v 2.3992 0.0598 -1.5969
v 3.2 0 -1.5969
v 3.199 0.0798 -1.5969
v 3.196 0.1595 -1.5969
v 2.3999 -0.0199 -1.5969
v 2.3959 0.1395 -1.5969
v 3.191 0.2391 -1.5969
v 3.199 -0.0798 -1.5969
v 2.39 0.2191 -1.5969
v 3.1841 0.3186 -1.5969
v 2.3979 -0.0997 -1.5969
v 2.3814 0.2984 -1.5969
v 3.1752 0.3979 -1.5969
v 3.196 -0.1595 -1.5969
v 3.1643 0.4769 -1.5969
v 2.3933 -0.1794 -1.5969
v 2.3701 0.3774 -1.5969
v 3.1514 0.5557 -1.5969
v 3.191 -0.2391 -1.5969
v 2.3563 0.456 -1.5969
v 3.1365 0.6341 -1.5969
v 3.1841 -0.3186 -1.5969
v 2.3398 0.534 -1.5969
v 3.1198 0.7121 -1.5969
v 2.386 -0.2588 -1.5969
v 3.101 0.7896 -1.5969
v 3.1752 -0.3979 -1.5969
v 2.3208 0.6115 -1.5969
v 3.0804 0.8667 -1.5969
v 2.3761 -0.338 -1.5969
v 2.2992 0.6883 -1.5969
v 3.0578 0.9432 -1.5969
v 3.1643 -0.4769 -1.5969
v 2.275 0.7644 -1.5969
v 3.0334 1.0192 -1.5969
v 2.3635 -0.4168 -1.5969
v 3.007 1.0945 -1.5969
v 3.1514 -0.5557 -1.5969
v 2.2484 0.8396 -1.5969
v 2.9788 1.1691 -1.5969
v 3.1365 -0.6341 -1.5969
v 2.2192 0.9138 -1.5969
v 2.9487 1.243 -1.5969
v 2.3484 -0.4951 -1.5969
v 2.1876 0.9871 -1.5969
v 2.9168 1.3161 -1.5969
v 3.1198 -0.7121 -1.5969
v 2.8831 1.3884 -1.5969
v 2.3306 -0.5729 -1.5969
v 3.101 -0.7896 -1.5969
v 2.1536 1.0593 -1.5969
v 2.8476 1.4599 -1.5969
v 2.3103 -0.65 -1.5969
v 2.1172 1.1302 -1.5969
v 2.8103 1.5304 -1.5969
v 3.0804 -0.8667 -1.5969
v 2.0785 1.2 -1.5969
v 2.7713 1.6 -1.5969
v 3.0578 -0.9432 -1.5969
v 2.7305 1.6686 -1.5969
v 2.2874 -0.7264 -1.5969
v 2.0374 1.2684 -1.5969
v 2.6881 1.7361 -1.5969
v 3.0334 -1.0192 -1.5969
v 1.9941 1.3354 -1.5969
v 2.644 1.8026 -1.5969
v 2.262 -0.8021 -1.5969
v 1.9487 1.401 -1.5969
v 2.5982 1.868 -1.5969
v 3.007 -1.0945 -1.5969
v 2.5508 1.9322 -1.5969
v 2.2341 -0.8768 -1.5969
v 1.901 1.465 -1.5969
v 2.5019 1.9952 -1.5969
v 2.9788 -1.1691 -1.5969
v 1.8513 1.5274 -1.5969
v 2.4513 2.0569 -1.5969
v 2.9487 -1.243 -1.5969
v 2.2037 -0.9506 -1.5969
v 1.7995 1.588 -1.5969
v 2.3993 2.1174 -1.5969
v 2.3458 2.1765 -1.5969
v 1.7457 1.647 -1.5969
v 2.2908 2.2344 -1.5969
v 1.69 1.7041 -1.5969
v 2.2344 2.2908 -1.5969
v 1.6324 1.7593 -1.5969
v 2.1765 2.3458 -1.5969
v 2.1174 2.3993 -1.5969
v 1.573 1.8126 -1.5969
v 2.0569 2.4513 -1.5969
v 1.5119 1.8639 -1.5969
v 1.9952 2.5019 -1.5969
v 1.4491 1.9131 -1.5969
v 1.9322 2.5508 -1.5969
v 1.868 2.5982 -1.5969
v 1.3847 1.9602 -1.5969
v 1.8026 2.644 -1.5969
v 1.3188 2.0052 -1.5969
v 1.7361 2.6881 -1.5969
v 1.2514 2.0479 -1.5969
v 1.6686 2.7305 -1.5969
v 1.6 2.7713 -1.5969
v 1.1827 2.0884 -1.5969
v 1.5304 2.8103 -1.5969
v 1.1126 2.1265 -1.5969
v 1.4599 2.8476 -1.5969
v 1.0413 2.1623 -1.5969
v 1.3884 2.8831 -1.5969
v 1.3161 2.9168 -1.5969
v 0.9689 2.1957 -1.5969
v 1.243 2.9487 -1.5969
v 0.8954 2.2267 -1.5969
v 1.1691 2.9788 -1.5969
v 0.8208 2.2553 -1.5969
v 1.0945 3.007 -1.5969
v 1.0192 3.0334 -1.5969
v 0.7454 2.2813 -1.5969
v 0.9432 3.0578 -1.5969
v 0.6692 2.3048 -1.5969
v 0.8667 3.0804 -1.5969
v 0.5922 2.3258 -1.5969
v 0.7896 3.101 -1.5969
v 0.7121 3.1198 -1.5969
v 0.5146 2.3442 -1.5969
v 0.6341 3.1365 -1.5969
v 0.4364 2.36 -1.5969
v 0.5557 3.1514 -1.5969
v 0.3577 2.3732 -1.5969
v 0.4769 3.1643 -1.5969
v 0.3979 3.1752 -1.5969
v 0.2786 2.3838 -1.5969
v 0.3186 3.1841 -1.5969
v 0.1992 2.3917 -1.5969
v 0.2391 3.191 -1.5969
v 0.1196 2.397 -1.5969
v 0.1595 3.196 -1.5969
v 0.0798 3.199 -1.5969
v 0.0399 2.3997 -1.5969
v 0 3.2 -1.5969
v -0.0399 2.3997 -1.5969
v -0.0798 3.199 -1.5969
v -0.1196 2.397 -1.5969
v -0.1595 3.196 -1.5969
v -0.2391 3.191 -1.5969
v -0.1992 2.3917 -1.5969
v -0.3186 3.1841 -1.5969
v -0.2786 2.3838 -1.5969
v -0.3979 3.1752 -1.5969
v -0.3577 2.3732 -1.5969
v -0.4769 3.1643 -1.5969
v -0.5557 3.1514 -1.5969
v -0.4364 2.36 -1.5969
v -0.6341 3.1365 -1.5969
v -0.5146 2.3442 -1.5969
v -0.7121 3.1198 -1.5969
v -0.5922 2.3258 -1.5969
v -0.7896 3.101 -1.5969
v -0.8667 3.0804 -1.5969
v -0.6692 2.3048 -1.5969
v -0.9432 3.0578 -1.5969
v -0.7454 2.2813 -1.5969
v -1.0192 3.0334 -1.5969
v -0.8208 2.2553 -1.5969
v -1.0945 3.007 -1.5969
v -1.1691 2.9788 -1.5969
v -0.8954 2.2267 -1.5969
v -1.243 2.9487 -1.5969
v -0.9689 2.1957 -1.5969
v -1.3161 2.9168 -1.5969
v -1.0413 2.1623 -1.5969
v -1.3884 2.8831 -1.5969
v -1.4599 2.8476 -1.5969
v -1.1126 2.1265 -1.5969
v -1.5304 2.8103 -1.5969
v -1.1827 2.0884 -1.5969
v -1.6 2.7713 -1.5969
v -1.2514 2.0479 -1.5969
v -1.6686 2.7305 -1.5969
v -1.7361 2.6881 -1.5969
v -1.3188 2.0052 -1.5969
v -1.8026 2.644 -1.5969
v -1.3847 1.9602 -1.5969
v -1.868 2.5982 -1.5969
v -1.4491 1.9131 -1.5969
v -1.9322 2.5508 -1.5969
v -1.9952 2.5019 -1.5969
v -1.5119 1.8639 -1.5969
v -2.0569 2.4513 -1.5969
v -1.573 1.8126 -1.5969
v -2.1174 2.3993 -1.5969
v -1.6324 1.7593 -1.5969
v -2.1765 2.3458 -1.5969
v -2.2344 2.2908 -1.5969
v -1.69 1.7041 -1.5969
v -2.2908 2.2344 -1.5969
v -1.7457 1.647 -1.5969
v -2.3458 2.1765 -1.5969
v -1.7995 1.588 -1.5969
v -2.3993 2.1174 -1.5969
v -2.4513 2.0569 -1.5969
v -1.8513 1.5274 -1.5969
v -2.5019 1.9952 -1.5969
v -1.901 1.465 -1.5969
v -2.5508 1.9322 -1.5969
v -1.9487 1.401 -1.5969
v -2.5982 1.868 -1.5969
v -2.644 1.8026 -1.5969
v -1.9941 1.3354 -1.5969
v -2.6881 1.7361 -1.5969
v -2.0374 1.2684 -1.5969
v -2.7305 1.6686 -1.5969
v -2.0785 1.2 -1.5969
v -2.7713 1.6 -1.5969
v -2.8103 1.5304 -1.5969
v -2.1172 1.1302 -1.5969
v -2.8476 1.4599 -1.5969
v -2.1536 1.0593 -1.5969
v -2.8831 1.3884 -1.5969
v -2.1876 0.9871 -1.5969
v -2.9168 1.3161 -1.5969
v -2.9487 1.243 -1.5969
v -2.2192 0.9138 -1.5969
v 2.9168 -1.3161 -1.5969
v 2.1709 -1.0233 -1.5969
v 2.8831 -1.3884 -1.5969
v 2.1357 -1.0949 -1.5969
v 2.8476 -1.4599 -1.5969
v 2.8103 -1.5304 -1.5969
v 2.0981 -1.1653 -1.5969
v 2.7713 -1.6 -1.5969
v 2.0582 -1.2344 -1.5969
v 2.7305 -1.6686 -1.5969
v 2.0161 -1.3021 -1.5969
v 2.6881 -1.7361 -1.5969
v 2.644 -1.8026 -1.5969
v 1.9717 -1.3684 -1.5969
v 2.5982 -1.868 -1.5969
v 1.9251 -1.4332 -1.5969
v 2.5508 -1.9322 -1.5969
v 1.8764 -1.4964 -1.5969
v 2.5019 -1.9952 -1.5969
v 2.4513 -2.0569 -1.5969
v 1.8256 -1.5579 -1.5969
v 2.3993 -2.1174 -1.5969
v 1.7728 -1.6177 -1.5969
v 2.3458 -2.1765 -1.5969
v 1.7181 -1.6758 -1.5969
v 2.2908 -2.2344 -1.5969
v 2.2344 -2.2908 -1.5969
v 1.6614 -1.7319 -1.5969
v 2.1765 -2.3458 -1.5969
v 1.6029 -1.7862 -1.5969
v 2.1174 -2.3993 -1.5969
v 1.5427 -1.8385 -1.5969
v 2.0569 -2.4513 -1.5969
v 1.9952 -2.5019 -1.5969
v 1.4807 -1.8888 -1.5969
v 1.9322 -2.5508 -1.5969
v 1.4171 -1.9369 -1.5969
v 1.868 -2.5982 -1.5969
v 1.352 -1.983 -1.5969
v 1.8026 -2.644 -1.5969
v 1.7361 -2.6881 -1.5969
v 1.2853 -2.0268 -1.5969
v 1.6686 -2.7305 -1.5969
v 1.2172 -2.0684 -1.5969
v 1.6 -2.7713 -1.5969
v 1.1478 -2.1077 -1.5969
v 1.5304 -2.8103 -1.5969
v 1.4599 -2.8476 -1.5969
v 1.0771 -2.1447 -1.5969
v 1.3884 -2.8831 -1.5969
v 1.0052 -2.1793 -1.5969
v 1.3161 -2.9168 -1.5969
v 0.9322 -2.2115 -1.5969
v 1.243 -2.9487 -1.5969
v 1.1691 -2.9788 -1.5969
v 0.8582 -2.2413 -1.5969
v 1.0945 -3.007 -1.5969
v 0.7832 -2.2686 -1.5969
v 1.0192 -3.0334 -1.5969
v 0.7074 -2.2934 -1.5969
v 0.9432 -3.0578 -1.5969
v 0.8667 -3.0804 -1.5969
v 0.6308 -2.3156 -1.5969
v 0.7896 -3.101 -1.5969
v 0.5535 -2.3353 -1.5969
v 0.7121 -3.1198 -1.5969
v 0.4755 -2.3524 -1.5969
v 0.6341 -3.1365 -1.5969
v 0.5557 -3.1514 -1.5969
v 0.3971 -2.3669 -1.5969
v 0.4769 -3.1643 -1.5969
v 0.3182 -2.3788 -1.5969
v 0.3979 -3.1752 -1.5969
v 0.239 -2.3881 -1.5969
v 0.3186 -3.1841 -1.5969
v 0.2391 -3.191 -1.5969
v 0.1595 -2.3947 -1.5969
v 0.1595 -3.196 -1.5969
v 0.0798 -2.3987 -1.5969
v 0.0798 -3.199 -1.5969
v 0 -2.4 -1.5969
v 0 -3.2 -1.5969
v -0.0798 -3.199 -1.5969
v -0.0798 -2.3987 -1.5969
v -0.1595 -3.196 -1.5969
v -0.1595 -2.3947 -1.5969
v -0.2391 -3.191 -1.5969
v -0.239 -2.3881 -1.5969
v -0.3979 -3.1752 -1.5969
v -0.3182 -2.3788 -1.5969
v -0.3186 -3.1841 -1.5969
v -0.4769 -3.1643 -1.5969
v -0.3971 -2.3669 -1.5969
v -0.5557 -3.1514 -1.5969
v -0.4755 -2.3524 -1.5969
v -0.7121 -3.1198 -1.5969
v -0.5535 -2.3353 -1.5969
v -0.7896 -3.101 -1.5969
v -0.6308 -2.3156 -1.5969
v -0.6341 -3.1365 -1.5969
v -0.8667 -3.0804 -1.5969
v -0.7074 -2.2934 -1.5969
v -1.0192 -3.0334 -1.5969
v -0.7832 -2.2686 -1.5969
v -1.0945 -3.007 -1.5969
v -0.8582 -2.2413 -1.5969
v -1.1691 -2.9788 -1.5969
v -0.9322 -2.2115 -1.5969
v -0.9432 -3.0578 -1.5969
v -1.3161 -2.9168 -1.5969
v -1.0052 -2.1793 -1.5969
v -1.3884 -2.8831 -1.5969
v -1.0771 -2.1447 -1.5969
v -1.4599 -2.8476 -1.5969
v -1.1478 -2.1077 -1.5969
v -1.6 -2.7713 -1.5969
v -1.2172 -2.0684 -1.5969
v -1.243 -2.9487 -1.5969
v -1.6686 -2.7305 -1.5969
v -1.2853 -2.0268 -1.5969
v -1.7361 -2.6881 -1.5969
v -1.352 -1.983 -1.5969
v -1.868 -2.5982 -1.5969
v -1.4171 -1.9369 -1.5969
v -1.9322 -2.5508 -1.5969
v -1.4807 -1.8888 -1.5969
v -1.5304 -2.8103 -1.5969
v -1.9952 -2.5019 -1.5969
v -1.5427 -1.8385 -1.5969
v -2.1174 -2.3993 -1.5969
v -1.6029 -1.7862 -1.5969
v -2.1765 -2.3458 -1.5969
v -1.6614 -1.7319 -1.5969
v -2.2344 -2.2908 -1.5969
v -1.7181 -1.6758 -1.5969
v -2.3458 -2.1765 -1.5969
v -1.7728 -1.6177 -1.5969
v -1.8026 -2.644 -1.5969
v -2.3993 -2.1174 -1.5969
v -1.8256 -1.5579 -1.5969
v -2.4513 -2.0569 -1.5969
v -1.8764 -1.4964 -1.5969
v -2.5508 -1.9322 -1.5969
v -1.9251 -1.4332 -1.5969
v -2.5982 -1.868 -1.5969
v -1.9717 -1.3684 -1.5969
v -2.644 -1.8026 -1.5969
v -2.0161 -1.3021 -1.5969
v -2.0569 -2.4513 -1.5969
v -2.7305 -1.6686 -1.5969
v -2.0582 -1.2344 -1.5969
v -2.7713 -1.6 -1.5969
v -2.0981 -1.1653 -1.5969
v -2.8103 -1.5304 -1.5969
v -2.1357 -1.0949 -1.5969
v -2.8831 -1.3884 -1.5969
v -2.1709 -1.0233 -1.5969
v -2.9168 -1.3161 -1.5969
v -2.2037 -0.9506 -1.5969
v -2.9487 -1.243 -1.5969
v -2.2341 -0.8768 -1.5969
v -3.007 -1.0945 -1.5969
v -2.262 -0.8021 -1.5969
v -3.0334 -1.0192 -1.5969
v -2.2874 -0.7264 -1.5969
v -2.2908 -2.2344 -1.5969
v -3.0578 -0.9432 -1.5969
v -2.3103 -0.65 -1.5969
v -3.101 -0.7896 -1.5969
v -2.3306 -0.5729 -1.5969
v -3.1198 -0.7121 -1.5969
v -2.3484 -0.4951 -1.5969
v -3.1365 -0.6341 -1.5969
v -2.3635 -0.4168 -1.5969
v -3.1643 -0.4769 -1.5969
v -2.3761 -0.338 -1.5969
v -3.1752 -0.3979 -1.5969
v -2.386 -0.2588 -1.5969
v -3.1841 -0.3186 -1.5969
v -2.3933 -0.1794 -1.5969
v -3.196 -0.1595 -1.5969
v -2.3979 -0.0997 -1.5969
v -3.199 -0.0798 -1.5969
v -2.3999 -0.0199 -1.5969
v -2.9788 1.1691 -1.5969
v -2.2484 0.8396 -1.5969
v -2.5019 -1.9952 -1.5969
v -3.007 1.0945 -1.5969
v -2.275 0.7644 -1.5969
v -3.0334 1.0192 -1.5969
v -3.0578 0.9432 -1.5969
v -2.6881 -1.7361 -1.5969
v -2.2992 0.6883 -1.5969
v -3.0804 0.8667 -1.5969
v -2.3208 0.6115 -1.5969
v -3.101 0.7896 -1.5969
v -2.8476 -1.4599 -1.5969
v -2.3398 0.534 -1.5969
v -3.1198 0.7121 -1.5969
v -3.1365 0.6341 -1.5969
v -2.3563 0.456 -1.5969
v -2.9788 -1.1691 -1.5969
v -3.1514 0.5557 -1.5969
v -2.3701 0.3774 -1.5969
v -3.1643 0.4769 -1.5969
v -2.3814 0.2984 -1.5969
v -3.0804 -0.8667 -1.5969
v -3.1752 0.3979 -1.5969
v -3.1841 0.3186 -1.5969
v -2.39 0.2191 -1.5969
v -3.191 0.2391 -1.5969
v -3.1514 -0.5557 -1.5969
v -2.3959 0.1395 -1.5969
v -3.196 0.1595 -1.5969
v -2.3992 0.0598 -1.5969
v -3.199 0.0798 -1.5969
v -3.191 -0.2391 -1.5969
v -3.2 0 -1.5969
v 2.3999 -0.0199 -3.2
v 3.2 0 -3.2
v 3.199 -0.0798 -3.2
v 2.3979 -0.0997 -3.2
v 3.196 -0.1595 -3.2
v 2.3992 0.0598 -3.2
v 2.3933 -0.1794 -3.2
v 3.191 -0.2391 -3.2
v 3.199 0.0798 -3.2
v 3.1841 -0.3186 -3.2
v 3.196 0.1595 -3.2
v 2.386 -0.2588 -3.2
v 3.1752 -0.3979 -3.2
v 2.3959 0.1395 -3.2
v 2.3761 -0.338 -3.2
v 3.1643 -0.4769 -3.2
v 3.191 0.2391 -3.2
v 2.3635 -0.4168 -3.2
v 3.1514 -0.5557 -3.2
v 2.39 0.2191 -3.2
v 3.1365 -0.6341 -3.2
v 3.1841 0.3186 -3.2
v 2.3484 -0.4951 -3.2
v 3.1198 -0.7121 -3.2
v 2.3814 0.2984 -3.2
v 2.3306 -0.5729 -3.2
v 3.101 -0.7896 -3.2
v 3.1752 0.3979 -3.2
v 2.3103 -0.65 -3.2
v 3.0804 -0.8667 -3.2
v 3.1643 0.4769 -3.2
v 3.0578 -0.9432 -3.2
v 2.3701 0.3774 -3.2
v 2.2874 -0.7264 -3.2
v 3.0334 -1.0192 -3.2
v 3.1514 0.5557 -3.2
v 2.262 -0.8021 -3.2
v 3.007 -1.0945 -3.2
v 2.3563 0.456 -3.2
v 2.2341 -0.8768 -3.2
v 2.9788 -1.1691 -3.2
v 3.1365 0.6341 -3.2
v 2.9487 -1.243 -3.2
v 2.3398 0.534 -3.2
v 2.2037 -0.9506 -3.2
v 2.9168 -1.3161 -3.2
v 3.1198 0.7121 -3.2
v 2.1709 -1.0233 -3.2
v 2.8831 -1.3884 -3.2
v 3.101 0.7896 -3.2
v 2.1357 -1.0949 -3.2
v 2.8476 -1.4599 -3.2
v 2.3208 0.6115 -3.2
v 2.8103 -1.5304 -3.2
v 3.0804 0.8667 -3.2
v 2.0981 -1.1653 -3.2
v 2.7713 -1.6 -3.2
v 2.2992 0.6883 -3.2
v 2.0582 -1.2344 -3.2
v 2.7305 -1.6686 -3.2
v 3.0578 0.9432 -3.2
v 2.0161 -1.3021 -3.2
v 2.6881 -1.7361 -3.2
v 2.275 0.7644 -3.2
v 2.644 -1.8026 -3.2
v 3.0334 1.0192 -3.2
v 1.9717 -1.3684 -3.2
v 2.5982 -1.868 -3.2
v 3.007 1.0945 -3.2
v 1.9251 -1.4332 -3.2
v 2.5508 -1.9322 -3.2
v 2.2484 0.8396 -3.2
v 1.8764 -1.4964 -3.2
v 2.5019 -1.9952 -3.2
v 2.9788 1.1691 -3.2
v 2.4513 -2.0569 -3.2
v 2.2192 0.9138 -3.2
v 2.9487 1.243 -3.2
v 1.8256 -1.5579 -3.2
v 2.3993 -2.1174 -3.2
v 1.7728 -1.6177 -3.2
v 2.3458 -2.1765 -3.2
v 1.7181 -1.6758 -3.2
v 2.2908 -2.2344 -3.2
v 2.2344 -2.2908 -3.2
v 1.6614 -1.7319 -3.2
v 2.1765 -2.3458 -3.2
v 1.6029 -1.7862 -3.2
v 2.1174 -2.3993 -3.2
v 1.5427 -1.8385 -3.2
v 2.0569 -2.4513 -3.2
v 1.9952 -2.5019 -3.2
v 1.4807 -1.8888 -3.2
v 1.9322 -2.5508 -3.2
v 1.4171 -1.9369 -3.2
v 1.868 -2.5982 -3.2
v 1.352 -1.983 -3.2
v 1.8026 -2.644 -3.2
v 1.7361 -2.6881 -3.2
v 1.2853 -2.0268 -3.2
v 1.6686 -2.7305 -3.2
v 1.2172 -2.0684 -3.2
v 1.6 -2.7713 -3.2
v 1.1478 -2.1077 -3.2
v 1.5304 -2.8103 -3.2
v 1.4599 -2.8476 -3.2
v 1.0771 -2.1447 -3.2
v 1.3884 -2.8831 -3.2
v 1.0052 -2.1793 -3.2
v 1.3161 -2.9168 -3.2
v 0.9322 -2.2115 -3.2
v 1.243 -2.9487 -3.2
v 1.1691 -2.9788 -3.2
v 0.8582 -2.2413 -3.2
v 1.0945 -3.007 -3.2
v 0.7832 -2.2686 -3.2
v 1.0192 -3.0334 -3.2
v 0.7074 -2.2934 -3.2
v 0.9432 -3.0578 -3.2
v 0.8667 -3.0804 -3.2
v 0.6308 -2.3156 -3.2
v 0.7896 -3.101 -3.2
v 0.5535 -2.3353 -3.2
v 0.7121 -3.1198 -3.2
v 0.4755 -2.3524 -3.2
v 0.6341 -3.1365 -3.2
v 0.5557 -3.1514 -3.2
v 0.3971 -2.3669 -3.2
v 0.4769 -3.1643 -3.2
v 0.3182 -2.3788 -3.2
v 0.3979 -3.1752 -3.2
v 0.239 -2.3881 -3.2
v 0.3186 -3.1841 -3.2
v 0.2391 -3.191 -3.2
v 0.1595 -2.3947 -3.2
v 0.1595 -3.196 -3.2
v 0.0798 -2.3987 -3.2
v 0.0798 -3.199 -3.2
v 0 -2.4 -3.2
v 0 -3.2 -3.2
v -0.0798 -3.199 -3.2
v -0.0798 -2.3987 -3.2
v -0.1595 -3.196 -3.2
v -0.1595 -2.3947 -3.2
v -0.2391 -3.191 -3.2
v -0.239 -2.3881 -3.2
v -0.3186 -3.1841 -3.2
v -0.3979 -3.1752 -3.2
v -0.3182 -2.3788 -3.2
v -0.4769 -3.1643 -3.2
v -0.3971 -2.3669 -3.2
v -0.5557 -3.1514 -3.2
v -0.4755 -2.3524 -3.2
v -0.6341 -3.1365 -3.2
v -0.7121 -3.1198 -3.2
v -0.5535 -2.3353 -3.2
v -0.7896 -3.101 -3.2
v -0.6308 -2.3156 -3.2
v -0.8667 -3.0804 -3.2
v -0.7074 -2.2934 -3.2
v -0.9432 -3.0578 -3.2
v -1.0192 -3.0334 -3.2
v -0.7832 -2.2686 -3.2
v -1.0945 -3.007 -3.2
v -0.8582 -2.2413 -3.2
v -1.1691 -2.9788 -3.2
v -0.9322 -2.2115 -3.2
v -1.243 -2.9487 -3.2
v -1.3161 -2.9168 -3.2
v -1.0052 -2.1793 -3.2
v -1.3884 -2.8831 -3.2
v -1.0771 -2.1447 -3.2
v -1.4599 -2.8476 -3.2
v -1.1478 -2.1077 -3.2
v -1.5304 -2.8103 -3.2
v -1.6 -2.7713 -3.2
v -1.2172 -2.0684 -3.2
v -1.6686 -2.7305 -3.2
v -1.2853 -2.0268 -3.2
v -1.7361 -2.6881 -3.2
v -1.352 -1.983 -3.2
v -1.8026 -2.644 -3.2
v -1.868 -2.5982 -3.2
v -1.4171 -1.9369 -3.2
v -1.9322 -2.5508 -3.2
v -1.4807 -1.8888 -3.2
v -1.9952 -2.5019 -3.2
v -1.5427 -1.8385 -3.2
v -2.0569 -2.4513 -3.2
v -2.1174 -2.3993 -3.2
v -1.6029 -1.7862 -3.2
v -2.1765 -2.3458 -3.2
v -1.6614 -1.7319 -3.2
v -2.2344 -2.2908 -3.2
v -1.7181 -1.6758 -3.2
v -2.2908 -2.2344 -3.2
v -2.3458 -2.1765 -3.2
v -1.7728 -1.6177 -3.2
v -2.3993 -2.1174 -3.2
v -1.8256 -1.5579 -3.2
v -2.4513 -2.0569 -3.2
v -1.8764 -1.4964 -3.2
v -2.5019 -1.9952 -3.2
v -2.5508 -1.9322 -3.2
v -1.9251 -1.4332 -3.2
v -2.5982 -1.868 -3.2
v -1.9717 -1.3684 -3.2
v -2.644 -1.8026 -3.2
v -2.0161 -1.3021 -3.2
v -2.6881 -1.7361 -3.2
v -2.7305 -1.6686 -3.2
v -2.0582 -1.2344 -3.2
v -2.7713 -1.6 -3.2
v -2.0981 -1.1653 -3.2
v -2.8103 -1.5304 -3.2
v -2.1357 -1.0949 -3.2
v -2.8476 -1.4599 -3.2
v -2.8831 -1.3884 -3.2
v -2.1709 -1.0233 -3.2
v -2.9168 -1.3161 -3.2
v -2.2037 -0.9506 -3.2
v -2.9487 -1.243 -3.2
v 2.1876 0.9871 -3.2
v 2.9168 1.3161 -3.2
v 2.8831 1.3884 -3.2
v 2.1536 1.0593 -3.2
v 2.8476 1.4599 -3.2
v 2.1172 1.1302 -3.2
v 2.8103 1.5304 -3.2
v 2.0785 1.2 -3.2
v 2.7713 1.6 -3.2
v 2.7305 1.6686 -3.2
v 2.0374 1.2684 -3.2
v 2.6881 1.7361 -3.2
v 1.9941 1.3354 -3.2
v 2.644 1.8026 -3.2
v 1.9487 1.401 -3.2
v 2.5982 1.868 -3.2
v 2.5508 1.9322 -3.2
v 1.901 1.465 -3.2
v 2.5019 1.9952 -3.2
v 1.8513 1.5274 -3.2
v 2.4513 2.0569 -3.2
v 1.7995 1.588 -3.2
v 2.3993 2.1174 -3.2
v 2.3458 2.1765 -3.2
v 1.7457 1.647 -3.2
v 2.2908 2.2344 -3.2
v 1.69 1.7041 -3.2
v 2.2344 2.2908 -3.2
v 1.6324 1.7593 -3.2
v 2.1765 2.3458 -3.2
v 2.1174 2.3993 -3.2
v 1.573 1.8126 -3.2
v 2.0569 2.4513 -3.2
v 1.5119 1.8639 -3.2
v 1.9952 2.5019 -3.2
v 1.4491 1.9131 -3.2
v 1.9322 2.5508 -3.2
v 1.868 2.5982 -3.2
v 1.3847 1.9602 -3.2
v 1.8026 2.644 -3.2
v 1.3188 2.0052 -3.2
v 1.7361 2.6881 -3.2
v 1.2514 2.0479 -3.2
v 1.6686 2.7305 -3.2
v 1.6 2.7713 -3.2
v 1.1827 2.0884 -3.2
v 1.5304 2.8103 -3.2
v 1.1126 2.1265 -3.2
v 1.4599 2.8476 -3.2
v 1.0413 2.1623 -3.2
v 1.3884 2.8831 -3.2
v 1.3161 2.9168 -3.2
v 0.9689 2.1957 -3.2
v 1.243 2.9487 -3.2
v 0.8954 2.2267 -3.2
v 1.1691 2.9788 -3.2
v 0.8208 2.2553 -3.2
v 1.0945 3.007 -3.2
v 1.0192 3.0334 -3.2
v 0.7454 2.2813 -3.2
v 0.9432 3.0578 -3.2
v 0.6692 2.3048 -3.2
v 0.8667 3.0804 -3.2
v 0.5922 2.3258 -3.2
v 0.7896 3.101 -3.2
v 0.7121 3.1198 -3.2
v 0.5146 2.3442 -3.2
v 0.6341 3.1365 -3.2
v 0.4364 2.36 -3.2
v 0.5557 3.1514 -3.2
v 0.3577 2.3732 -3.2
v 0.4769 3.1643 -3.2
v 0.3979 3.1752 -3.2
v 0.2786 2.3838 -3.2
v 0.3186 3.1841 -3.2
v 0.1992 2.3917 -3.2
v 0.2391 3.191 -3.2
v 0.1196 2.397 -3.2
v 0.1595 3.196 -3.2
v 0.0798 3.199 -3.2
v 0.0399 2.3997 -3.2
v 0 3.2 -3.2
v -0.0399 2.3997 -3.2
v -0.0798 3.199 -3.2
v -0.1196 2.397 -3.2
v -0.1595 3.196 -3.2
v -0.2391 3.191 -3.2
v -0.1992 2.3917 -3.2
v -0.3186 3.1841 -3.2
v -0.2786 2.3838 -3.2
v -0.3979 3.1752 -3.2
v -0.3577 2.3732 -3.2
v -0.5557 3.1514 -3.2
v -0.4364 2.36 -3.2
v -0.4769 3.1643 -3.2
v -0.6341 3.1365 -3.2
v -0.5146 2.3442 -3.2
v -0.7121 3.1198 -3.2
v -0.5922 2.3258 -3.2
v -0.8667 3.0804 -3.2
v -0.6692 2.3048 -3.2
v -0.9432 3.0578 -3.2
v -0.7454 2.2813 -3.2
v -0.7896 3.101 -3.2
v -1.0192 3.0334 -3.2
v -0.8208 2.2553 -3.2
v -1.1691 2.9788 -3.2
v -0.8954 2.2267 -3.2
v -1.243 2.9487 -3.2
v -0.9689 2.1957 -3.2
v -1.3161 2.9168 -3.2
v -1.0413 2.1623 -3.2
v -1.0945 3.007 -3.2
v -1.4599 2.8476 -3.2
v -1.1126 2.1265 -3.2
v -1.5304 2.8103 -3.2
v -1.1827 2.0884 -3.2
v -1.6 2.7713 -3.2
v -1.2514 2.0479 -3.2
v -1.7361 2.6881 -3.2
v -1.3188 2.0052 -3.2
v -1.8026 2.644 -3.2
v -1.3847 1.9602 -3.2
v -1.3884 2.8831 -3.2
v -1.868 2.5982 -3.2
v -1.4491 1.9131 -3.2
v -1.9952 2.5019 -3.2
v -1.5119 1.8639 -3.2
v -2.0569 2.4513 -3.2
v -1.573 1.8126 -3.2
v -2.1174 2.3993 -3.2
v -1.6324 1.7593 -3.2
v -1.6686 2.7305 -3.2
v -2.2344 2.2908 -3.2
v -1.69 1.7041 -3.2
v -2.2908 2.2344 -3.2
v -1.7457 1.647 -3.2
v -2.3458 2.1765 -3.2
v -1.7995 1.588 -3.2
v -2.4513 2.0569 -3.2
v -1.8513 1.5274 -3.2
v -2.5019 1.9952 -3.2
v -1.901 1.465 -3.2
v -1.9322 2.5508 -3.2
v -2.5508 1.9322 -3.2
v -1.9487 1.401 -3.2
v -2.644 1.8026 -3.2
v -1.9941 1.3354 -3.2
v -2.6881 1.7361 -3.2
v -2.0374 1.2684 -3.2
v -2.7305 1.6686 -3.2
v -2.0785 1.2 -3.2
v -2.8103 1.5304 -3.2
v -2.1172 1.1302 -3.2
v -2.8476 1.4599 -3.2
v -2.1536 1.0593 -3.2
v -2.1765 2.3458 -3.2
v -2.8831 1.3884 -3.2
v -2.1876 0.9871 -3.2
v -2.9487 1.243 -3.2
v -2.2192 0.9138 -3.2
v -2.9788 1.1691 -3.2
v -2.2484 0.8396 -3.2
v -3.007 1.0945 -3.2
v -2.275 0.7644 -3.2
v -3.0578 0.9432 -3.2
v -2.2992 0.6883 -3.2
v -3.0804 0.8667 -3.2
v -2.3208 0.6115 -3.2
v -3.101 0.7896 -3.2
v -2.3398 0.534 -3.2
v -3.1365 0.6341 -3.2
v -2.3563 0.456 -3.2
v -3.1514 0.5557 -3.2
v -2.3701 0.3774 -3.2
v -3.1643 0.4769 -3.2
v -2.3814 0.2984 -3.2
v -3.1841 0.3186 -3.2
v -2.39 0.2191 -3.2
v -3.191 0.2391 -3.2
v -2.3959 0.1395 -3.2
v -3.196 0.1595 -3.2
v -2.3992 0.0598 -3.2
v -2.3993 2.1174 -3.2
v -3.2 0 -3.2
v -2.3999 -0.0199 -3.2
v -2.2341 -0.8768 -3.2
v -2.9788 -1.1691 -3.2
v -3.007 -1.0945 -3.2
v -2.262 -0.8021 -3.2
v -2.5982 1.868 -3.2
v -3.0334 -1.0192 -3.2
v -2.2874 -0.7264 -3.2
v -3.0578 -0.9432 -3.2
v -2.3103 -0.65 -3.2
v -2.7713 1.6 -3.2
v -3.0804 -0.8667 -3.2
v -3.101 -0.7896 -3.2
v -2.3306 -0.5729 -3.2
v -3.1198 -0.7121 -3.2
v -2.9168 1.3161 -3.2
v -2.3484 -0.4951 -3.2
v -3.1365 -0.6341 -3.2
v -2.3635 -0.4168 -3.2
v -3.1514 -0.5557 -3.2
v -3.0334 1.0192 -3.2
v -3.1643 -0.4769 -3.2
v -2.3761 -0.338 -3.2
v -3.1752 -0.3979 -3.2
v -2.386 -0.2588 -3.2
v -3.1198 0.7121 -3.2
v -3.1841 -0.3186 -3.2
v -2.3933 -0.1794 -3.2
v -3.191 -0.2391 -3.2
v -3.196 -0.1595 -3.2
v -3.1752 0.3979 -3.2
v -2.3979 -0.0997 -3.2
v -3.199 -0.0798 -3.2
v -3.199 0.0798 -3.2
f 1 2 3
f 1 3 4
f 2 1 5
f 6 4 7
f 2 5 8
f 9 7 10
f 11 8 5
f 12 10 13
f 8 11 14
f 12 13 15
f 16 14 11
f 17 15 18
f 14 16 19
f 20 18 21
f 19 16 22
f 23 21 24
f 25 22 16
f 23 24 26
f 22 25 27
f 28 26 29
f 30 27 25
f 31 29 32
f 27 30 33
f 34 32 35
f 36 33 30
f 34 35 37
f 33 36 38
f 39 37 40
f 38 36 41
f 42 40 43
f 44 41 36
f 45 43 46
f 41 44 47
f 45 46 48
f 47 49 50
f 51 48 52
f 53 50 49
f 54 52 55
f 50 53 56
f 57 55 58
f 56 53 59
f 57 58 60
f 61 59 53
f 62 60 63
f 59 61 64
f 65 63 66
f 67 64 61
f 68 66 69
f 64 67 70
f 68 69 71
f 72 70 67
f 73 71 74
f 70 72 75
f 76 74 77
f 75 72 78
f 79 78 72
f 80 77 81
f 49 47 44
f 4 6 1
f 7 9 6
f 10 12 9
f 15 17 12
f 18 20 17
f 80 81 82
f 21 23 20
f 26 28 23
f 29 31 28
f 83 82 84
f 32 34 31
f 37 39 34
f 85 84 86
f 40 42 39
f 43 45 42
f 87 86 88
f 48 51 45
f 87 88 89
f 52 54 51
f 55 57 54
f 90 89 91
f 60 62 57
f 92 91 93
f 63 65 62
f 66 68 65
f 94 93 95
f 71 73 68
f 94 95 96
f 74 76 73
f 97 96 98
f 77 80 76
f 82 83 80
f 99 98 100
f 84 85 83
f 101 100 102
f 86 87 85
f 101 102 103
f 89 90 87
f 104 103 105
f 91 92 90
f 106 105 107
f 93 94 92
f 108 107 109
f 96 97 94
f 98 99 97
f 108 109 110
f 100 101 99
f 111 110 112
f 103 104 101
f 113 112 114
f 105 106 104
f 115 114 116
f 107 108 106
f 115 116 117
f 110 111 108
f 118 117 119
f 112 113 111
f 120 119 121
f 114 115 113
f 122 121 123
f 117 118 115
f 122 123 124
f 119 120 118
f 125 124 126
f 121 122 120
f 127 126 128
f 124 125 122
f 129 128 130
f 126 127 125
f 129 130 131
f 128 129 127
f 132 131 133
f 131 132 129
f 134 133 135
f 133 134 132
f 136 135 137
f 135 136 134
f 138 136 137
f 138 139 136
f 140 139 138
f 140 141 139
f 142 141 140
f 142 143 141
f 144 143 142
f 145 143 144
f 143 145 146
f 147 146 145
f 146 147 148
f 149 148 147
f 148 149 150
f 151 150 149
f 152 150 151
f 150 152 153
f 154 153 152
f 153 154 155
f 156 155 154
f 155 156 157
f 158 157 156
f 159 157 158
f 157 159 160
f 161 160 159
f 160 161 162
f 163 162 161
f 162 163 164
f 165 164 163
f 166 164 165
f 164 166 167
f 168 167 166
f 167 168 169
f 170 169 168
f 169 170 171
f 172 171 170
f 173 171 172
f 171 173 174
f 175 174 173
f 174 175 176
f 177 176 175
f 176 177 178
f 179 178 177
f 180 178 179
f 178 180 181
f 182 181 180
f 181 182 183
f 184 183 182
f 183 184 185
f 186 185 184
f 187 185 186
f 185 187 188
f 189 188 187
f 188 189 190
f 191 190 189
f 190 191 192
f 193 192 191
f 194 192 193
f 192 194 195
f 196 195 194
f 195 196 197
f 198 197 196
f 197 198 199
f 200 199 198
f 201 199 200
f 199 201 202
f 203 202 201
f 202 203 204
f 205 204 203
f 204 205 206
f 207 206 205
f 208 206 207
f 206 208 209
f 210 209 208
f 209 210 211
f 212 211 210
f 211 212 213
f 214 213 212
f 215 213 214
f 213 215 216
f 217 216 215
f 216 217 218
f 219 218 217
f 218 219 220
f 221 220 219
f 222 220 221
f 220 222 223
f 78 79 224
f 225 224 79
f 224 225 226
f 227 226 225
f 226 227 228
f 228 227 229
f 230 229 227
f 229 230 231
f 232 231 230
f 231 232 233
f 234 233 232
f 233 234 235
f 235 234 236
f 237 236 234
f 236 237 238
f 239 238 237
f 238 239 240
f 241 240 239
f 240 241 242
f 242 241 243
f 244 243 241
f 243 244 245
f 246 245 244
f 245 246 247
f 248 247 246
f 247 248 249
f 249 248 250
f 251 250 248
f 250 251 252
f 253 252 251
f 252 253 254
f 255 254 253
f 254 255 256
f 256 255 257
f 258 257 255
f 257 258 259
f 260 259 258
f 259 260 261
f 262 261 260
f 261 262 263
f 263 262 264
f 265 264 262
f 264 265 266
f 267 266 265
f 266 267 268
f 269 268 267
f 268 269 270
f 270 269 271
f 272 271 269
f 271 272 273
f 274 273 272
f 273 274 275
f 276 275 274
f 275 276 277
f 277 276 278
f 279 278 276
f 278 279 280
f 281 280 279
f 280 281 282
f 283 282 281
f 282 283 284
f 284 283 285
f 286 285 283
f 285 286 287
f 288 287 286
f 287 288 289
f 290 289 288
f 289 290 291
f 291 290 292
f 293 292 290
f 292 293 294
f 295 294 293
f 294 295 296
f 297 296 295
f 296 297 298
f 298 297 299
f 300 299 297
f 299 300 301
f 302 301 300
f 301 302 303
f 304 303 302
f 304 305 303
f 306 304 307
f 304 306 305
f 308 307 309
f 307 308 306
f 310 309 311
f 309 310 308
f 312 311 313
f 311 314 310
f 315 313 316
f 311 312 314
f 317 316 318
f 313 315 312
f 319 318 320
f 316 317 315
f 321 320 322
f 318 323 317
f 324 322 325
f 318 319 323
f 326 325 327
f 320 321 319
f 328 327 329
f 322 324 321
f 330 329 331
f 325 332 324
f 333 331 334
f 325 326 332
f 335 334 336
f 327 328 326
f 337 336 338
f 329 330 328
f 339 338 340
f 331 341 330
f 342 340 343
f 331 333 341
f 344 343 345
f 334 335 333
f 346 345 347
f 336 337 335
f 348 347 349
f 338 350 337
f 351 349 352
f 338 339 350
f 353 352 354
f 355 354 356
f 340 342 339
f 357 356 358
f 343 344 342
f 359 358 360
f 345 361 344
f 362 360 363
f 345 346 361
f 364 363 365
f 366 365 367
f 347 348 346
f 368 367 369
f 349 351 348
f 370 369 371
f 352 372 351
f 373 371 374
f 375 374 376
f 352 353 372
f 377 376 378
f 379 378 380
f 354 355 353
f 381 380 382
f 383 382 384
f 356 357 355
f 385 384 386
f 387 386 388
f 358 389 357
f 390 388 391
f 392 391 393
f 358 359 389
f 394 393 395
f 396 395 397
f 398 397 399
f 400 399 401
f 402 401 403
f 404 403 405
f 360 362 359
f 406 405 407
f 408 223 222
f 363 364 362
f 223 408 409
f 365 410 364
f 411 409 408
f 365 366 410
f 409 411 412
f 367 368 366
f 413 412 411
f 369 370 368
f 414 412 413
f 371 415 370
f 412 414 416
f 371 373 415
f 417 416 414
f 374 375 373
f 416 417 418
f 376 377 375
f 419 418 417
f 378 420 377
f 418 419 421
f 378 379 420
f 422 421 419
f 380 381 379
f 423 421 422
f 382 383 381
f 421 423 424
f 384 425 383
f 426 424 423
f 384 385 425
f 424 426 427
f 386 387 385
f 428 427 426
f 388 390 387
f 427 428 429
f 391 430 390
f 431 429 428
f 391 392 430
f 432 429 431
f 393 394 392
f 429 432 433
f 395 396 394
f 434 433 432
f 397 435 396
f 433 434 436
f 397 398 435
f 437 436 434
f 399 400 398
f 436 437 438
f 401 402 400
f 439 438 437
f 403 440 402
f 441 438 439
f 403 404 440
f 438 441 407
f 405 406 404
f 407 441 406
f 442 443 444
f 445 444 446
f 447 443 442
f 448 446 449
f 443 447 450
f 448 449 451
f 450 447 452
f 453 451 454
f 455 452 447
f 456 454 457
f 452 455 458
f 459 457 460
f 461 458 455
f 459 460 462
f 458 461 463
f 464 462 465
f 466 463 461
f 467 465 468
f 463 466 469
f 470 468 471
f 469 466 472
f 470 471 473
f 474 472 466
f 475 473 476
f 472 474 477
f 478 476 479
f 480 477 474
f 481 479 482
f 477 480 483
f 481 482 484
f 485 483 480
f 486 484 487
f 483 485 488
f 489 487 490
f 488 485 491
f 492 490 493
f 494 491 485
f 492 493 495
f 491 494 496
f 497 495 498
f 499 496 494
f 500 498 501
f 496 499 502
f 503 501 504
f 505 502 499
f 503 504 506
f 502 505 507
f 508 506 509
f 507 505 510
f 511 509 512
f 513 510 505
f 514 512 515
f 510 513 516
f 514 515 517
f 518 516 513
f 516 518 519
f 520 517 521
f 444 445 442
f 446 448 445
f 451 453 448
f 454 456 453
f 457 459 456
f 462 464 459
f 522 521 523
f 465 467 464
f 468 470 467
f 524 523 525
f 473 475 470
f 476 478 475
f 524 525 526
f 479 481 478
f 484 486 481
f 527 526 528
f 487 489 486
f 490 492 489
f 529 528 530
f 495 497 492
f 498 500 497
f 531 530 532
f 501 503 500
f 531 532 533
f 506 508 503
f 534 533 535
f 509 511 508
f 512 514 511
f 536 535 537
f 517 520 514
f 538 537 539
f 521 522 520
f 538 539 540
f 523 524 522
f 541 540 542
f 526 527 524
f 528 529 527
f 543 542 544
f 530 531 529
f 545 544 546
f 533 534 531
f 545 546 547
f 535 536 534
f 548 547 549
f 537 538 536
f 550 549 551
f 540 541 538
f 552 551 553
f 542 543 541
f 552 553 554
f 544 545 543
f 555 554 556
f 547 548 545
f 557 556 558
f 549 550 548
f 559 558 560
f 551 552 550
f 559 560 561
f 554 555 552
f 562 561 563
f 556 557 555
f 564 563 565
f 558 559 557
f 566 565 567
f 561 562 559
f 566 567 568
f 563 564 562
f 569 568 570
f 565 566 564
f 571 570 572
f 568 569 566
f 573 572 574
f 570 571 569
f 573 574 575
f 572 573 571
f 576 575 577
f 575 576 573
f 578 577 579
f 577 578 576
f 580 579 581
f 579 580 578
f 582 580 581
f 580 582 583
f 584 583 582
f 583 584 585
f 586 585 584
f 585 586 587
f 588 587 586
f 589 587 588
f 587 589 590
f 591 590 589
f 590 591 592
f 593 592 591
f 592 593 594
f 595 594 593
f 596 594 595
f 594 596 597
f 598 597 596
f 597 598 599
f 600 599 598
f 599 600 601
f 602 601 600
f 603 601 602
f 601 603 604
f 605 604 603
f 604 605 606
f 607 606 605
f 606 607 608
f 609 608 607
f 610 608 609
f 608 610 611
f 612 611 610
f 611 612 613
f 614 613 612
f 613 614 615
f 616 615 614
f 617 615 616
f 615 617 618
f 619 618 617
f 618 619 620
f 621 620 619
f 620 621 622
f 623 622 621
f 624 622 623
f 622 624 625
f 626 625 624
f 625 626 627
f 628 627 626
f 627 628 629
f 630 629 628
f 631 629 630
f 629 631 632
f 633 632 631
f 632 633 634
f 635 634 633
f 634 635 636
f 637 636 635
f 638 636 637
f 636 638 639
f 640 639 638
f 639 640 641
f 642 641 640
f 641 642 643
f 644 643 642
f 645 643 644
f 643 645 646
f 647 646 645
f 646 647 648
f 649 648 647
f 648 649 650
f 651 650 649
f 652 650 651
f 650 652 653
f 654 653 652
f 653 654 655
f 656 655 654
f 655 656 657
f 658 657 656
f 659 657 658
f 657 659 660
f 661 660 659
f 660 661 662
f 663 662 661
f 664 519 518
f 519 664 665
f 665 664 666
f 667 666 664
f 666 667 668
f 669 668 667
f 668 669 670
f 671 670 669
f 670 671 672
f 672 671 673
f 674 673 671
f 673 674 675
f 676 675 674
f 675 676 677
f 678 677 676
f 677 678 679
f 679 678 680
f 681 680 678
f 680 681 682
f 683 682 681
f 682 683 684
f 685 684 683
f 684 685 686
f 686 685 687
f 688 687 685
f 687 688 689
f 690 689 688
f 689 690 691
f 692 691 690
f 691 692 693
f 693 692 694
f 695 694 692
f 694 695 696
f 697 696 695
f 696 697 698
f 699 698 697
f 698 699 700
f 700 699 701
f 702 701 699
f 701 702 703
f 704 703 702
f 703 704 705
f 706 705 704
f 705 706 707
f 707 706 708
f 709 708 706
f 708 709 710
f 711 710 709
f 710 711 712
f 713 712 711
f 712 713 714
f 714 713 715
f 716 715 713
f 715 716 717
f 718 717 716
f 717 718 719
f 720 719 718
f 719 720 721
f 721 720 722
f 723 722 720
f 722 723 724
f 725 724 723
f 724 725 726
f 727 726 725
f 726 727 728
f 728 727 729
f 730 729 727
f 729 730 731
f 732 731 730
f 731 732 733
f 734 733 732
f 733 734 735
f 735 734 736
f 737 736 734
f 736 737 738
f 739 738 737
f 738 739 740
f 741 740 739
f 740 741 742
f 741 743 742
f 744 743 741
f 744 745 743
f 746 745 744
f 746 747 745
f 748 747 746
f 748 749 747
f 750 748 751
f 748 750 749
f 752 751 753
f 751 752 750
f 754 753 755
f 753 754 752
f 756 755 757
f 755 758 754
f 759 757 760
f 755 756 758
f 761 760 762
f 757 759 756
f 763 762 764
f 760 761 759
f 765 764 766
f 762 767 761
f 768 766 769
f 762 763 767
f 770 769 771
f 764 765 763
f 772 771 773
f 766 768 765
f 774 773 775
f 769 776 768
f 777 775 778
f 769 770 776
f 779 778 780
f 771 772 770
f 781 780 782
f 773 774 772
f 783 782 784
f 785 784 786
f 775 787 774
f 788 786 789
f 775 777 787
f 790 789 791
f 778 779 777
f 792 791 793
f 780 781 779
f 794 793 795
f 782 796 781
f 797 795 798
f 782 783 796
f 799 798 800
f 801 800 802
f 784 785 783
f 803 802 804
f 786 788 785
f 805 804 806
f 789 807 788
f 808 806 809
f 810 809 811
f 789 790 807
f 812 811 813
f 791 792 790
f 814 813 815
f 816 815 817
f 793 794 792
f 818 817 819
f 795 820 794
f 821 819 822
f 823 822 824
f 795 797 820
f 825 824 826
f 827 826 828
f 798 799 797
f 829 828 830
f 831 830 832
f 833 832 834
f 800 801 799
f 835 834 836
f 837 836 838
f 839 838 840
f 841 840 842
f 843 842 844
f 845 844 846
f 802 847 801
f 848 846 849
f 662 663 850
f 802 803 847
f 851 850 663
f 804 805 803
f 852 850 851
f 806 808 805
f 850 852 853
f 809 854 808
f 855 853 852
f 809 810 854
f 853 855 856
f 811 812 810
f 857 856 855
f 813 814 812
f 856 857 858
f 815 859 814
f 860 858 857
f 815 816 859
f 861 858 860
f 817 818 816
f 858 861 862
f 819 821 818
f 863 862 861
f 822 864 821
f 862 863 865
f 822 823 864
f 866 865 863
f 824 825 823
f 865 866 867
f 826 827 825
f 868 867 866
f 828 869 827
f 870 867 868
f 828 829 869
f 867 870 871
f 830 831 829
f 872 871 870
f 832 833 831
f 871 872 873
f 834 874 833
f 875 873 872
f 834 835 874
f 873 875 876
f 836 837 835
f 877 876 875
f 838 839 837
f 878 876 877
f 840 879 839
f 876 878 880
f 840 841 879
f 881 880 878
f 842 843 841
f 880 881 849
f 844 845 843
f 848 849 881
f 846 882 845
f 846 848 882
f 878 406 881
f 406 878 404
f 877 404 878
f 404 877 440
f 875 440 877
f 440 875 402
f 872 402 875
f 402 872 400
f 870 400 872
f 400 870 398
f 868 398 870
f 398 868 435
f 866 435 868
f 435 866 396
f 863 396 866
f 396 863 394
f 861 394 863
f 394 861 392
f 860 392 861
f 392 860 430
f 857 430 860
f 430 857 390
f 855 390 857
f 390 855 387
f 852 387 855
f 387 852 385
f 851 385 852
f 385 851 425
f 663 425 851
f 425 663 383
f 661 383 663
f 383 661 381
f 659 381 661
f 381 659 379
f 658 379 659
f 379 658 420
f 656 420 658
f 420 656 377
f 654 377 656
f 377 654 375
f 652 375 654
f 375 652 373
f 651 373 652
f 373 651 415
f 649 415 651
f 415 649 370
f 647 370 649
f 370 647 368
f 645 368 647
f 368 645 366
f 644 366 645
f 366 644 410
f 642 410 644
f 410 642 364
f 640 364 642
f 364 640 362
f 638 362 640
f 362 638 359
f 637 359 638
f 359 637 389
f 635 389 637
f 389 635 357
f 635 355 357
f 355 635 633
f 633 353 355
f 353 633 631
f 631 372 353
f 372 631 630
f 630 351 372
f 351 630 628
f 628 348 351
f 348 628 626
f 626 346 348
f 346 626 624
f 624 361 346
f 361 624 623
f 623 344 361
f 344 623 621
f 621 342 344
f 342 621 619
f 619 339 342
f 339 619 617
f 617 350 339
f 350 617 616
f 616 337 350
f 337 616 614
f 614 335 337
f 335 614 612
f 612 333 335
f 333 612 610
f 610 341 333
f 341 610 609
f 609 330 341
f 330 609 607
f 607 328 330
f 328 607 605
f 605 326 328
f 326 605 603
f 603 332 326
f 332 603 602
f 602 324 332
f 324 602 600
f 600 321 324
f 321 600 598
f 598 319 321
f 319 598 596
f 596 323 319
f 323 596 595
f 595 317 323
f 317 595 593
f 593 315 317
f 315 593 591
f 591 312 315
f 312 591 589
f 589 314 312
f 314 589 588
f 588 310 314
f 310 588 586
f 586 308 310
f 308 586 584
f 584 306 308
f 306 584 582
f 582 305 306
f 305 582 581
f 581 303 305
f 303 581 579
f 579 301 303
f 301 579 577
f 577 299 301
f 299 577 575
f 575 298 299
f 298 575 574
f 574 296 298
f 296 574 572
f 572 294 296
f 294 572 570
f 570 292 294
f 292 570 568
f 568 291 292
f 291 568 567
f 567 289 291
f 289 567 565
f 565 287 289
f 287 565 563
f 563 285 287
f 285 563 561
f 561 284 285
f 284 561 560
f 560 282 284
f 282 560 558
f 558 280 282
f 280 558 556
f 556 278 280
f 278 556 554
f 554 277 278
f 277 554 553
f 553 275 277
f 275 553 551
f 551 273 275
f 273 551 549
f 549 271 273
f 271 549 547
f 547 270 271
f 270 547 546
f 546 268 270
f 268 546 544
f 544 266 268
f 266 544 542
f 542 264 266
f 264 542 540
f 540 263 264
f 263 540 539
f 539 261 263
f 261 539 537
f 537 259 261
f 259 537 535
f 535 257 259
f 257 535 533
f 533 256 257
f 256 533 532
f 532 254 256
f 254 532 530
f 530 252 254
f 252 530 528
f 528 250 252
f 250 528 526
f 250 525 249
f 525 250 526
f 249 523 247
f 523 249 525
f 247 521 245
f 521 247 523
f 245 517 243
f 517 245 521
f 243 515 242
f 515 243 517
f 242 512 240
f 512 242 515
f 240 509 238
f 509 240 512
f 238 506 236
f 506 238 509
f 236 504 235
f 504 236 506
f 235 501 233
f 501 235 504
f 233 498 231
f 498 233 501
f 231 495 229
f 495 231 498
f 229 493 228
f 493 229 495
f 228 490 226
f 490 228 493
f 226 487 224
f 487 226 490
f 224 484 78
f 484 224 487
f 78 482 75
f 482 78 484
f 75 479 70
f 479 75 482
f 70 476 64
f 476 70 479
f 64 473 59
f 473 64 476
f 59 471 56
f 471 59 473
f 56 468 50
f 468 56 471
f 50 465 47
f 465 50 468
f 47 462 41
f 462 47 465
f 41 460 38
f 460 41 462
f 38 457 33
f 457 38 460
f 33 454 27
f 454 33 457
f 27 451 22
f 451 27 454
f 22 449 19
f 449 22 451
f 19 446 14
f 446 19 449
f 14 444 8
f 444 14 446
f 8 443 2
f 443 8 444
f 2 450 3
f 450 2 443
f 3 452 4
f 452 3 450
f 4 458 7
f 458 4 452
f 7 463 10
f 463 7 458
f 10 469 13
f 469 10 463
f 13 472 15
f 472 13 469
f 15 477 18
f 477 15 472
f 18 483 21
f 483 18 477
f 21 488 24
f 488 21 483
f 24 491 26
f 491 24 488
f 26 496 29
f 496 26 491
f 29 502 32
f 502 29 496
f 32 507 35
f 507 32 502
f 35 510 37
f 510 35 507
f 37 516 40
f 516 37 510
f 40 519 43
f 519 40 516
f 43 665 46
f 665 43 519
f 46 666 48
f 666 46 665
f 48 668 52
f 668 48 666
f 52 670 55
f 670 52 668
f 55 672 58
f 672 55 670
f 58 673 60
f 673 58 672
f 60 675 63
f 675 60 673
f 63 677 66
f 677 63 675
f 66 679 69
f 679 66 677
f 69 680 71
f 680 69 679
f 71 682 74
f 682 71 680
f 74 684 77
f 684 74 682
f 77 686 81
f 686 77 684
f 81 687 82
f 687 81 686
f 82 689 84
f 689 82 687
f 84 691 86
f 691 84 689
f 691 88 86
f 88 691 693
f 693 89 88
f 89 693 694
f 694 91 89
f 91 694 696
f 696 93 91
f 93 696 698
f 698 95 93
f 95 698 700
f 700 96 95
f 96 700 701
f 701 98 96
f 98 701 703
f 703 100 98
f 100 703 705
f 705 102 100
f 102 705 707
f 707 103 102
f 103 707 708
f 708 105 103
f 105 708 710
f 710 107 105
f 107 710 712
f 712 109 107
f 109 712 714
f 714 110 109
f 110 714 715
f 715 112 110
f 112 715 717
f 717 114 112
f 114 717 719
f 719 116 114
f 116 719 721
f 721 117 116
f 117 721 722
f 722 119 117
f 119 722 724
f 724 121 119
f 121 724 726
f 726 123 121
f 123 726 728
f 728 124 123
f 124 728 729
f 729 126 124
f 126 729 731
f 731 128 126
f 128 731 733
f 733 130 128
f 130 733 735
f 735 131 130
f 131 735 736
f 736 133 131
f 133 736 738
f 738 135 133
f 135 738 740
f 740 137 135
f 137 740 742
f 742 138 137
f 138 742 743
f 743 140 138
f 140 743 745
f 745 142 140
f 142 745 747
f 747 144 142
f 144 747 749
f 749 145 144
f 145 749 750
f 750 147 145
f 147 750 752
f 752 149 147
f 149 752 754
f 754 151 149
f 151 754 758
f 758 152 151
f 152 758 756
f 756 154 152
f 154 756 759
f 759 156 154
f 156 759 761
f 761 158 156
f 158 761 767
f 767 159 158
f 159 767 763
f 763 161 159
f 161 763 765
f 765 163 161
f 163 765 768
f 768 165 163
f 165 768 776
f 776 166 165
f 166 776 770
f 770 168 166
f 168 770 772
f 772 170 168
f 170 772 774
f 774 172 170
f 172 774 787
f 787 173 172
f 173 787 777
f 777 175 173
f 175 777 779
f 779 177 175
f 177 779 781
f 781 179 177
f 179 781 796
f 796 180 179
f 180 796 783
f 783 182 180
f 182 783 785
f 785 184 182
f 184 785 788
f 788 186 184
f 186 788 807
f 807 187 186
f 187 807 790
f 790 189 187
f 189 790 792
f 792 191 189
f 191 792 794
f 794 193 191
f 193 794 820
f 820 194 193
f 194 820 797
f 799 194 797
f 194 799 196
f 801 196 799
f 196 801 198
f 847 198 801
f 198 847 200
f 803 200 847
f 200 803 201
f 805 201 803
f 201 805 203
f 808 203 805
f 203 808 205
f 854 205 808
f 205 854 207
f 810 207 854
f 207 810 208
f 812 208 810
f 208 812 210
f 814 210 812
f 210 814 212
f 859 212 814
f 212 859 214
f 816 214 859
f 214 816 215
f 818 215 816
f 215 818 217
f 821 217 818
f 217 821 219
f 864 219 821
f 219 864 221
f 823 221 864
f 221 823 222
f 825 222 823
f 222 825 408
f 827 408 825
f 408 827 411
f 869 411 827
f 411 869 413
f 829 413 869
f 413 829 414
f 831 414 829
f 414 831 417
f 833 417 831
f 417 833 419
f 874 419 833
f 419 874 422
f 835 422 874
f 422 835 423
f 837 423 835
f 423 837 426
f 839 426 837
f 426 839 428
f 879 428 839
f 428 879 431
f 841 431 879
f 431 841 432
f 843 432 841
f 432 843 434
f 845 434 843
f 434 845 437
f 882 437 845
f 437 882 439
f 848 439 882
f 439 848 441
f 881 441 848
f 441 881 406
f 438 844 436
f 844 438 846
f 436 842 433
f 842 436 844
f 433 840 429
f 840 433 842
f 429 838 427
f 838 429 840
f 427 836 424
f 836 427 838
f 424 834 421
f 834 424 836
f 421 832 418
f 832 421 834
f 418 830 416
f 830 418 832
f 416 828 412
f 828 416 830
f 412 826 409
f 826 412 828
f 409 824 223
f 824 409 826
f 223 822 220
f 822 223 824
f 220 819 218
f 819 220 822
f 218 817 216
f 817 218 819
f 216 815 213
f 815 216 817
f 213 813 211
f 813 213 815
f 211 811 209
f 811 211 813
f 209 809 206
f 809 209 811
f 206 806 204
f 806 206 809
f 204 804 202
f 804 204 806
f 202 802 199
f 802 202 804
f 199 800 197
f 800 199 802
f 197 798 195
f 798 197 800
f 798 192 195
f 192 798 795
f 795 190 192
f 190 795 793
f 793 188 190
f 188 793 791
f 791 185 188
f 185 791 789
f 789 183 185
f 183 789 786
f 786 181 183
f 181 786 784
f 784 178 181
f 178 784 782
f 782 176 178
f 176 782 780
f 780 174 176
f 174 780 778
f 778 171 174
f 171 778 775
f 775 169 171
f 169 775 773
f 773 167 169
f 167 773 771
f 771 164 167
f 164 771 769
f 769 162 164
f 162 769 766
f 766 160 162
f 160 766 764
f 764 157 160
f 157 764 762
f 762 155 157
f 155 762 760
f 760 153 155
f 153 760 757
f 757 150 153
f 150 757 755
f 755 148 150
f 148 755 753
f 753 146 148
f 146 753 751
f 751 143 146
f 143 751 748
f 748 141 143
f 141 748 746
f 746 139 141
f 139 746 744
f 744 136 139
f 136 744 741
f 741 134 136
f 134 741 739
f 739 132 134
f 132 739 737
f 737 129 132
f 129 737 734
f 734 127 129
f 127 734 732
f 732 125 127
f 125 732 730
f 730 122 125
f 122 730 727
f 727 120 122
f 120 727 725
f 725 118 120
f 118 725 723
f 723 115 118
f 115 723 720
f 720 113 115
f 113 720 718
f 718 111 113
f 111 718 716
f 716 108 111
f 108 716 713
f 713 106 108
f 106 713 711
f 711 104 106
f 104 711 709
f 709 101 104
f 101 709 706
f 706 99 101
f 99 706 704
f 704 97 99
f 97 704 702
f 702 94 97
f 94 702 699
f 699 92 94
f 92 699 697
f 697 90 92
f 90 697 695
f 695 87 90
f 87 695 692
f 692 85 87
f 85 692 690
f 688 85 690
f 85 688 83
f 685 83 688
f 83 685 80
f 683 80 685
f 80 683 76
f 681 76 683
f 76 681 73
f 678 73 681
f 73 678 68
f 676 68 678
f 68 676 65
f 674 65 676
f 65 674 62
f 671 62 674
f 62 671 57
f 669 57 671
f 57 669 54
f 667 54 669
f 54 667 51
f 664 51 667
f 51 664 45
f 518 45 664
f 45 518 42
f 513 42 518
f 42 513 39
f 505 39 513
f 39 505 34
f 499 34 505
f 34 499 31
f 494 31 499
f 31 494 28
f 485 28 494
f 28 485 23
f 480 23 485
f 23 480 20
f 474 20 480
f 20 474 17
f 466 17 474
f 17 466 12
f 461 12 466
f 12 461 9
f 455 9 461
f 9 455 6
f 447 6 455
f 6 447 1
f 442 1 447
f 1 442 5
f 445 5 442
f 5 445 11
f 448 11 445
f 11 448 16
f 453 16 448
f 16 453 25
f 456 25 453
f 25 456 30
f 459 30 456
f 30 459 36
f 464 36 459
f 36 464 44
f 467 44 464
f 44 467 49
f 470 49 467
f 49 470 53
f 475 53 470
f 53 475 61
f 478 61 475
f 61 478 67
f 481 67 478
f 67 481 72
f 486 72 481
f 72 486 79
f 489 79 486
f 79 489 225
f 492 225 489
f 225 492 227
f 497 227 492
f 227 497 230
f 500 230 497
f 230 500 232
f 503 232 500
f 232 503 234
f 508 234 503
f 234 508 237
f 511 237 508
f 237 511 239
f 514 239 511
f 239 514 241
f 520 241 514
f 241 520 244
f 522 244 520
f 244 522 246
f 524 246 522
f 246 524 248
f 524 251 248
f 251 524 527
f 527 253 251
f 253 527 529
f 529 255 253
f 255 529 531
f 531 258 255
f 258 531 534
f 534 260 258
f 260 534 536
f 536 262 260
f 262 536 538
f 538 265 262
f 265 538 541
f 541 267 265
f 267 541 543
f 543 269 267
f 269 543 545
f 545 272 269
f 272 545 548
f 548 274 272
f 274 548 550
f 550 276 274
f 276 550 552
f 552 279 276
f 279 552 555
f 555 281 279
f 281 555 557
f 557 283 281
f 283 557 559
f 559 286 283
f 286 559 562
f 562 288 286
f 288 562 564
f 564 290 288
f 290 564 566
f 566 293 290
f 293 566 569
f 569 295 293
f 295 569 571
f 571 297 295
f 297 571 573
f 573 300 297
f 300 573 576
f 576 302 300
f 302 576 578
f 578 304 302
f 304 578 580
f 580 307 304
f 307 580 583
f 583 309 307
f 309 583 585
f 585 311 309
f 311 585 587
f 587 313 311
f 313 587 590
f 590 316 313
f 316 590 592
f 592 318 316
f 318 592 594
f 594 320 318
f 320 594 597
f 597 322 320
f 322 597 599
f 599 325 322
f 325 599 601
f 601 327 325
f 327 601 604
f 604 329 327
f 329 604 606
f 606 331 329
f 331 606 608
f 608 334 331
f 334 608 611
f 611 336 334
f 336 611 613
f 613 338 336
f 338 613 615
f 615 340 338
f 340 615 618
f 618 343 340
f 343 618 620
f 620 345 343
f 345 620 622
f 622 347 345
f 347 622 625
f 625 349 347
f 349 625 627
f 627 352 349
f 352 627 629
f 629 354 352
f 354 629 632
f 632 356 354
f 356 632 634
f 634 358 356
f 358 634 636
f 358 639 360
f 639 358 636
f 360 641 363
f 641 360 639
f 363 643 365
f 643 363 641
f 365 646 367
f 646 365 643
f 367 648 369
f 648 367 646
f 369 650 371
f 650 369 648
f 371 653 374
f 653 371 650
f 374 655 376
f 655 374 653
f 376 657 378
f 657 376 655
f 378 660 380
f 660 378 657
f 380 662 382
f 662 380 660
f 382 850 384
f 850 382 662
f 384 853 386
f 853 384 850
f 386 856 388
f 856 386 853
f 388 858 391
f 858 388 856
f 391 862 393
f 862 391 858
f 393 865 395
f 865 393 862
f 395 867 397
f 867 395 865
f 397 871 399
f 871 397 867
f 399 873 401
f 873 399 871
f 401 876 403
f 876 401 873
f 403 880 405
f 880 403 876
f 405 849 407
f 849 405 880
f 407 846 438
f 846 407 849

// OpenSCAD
use <../lib.scad>
use <3068bp87.scad>
$fa=1; $fs=0.2;
function ldraw_lib__3068p87(realsolid=false) = [
// 0 ~Moved to 3068bp87
// 0 Name: 3068p87.dat
// 0 Author: [PTadmin]
// 0 !LDRAW_ORG Part UPDATE 2002-04
// 0 !LICENSE Licensed under CC BY 4.0 : see CAreadme.txt
// 
// 0 BFC CERTIFY CCW
  [0,"BFC","CERTIFY"],
  [0,"BFC","CCW"],
// 
// 0 !HISTORY 2000-05-07 [PTadmin] Official Update 2000-01
// 0 !HISTORY 2002-08-18 [PTadmin] Official Update 2002-04
// 0 !HISTORY 2007-06-13 [PTadmin] Header formatted for Contributor Agreement
// 0 !HISTORY 2008-07-01 [PTadmin] Official Update 2008-01
// 
// 
// 1 16 0 0 0 1 0 0 0 1 0 0 0 1 3068bp87.dat
  [1,16,0,0,0,1,0,0,0,1,0,0,0,1, ldraw_lib__3068bp87(realsolid)],
];
module ldraw_lib__3068p87(step=0, col=false, unit=2/5, alt=false, line=0.2, solid=!$preview)
    makepoly(ldraw_lib__3068p87(solid), step=step, col=col, unit=unit, alt=alt, line=line, solid=solid);
ldraw_lib__3068p87(line=0.2);
